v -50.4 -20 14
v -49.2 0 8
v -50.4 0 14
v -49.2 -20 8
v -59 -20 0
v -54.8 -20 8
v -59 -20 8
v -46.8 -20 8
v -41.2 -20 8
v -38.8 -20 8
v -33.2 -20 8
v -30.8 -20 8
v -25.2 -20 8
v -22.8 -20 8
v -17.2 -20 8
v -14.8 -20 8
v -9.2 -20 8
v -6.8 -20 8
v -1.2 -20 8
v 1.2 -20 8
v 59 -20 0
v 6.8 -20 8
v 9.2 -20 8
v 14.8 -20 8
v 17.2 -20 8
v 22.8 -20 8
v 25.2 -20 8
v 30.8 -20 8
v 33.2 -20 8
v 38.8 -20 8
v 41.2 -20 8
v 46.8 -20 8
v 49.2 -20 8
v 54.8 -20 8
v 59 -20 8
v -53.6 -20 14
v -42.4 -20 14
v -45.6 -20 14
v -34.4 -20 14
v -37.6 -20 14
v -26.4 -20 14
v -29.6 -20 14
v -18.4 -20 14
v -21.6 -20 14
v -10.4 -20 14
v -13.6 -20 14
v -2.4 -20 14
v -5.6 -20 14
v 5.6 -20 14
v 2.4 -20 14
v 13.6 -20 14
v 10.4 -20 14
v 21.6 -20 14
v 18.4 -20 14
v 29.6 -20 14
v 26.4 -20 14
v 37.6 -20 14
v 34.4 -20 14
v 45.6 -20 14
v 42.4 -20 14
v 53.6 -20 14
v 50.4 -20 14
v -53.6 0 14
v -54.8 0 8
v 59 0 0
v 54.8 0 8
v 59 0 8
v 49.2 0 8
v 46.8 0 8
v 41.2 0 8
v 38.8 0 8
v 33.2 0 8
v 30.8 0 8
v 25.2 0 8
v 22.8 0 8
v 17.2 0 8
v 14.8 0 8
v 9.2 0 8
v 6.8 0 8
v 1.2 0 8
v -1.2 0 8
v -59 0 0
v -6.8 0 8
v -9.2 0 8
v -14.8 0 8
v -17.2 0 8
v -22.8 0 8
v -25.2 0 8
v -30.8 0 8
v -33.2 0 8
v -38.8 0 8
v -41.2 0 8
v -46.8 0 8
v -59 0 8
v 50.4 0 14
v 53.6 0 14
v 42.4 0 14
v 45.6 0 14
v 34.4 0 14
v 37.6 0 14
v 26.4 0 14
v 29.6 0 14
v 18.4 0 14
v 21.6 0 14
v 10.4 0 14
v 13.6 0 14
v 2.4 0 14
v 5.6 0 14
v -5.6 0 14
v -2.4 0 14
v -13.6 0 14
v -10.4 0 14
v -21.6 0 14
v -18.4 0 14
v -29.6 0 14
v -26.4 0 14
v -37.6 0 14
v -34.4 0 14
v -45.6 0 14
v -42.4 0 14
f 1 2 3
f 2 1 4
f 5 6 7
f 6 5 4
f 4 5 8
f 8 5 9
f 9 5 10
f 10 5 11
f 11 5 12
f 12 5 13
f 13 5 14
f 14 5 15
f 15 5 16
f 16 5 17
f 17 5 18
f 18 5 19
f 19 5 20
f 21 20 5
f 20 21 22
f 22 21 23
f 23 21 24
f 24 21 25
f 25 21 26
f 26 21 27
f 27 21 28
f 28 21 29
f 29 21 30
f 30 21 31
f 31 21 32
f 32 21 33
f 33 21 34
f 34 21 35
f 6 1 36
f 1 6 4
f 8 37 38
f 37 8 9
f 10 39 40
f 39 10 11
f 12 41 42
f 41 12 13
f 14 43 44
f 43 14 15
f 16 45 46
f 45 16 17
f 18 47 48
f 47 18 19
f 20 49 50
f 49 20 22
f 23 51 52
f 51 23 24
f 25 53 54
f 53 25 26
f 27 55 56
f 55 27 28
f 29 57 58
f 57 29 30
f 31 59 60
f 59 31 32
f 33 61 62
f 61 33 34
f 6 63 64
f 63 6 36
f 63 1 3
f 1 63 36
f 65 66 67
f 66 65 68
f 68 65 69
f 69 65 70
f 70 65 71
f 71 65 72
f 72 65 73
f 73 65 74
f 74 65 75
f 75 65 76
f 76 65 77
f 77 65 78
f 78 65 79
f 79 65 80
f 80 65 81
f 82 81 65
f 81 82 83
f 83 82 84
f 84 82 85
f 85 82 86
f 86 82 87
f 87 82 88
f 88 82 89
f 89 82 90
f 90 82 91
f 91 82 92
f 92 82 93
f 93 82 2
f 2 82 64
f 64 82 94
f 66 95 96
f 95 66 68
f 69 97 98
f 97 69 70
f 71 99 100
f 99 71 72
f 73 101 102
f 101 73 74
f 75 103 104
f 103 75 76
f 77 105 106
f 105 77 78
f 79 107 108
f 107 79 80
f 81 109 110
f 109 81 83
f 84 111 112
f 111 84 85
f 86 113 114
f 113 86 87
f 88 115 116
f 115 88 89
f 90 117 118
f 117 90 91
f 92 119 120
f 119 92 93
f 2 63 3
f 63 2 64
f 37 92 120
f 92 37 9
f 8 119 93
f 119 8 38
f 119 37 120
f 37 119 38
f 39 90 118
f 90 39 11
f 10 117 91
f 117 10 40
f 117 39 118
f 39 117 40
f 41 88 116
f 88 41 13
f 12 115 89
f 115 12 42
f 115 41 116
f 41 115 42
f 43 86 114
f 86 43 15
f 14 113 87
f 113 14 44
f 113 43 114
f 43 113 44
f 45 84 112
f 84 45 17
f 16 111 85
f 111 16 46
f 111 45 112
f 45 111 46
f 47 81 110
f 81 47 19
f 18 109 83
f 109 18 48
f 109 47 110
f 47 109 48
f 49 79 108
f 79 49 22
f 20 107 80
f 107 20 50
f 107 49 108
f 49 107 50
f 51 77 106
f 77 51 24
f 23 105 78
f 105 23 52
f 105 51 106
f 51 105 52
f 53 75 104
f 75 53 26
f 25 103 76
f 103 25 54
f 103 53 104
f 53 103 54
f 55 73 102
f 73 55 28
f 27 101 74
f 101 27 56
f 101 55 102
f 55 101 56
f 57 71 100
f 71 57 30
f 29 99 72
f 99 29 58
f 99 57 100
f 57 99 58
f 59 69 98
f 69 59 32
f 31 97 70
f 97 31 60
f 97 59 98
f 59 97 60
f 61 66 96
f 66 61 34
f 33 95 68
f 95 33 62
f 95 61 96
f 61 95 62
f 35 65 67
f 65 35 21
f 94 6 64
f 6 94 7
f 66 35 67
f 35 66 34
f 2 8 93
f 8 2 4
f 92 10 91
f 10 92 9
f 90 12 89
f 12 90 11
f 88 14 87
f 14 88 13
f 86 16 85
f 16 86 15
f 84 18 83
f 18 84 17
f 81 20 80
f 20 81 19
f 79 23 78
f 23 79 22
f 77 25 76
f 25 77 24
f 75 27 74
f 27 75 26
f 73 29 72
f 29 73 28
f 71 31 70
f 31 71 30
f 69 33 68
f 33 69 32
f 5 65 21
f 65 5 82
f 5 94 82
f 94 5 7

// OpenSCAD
$fn = 32;

// ----------------------------------------------------------------------
// Toothed rack, 14 teeth
// 8 mm pitch, 6 mm teeth
// ----------------------------------------------------------------------

// --- parameters (mm) ---
bar_w = 20;     // bar width (Y)
bar_h = 8;      // bar height (Z)
teeth = 14;     // number of teeth
pitch = 8;      // tooth pitch
tooth_h = 6;    // tooth height above the bar
root_w = 6;     // tooth width at the root
crest_w = 3.2;  // tooth width at the crest

// --- derived feature positions (mm) ---
span = (teeth - 1) * pitch;  // = 104   distance between the outer teeth
bar_l = span + root_w + 8;   // = 118   bar length: teeth plus 4 mm at each end
tooth_x = -span / 2;         // = -52   X of the first tooth
height = bar_h + tooth_h;    // = 14   overall height
feature_centers = [
  [tooth_x + 0 * pitch, -bar_w / 2],
  [tooth_x + 1 * pitch, -bar_w / 2],
  [tooth_x + 2 * pitch, -bar_w / 2],
  [tooth_x + 3 * pitch, -bar_w / 2],
  [tooth_x + 4 * pitch, -bar_w / 2],
  [tooth_x + 5 * pitch, -bar_w / 2],
  [tooth_x + 6 * pitch, -bar_w / 2],
  [tooth_x + 7 * pitch, -bar_w / 2],
  [tooth_x + 8 * pitch, -bar_w / 2],
  [tooth_x + 9 * pitch, -bar_w / 2],
  [tooth_x + 10 * pitch, -bar_w / 2],
  [tooth_x + 11 * pitch, -bar_w / 2],
  [tooth_x + 12 * pitch, -bar_w / 2],
  [tooth_x + 13 * pitch, -bar_w / 2]
];   // tooth centre line, drives the tooth loop

// bar with a rack of teeth, one extruded trapezoium per centre
module rack_tooth() {
  linear_extrude(height = bar_w)
    polygon(points = [
      [0, 0],
      [root_w, 0],
      [root_w / 2 + crest_w / 2, tooth_h + 1],
      [root_w / 2 - crest_w / 2, tooth_h + 1]
    ]);
}

union() {
  translate([-bar_l / 2, -bar_w, 0]) cube([bar_l, bar_w, bar_h]);
  for (centre = feature_centers)
    translate([centre[0] - root_w / 2, 0, bar_h - 1]) rotate([90, 0, 0]) rack_tooth();
}
